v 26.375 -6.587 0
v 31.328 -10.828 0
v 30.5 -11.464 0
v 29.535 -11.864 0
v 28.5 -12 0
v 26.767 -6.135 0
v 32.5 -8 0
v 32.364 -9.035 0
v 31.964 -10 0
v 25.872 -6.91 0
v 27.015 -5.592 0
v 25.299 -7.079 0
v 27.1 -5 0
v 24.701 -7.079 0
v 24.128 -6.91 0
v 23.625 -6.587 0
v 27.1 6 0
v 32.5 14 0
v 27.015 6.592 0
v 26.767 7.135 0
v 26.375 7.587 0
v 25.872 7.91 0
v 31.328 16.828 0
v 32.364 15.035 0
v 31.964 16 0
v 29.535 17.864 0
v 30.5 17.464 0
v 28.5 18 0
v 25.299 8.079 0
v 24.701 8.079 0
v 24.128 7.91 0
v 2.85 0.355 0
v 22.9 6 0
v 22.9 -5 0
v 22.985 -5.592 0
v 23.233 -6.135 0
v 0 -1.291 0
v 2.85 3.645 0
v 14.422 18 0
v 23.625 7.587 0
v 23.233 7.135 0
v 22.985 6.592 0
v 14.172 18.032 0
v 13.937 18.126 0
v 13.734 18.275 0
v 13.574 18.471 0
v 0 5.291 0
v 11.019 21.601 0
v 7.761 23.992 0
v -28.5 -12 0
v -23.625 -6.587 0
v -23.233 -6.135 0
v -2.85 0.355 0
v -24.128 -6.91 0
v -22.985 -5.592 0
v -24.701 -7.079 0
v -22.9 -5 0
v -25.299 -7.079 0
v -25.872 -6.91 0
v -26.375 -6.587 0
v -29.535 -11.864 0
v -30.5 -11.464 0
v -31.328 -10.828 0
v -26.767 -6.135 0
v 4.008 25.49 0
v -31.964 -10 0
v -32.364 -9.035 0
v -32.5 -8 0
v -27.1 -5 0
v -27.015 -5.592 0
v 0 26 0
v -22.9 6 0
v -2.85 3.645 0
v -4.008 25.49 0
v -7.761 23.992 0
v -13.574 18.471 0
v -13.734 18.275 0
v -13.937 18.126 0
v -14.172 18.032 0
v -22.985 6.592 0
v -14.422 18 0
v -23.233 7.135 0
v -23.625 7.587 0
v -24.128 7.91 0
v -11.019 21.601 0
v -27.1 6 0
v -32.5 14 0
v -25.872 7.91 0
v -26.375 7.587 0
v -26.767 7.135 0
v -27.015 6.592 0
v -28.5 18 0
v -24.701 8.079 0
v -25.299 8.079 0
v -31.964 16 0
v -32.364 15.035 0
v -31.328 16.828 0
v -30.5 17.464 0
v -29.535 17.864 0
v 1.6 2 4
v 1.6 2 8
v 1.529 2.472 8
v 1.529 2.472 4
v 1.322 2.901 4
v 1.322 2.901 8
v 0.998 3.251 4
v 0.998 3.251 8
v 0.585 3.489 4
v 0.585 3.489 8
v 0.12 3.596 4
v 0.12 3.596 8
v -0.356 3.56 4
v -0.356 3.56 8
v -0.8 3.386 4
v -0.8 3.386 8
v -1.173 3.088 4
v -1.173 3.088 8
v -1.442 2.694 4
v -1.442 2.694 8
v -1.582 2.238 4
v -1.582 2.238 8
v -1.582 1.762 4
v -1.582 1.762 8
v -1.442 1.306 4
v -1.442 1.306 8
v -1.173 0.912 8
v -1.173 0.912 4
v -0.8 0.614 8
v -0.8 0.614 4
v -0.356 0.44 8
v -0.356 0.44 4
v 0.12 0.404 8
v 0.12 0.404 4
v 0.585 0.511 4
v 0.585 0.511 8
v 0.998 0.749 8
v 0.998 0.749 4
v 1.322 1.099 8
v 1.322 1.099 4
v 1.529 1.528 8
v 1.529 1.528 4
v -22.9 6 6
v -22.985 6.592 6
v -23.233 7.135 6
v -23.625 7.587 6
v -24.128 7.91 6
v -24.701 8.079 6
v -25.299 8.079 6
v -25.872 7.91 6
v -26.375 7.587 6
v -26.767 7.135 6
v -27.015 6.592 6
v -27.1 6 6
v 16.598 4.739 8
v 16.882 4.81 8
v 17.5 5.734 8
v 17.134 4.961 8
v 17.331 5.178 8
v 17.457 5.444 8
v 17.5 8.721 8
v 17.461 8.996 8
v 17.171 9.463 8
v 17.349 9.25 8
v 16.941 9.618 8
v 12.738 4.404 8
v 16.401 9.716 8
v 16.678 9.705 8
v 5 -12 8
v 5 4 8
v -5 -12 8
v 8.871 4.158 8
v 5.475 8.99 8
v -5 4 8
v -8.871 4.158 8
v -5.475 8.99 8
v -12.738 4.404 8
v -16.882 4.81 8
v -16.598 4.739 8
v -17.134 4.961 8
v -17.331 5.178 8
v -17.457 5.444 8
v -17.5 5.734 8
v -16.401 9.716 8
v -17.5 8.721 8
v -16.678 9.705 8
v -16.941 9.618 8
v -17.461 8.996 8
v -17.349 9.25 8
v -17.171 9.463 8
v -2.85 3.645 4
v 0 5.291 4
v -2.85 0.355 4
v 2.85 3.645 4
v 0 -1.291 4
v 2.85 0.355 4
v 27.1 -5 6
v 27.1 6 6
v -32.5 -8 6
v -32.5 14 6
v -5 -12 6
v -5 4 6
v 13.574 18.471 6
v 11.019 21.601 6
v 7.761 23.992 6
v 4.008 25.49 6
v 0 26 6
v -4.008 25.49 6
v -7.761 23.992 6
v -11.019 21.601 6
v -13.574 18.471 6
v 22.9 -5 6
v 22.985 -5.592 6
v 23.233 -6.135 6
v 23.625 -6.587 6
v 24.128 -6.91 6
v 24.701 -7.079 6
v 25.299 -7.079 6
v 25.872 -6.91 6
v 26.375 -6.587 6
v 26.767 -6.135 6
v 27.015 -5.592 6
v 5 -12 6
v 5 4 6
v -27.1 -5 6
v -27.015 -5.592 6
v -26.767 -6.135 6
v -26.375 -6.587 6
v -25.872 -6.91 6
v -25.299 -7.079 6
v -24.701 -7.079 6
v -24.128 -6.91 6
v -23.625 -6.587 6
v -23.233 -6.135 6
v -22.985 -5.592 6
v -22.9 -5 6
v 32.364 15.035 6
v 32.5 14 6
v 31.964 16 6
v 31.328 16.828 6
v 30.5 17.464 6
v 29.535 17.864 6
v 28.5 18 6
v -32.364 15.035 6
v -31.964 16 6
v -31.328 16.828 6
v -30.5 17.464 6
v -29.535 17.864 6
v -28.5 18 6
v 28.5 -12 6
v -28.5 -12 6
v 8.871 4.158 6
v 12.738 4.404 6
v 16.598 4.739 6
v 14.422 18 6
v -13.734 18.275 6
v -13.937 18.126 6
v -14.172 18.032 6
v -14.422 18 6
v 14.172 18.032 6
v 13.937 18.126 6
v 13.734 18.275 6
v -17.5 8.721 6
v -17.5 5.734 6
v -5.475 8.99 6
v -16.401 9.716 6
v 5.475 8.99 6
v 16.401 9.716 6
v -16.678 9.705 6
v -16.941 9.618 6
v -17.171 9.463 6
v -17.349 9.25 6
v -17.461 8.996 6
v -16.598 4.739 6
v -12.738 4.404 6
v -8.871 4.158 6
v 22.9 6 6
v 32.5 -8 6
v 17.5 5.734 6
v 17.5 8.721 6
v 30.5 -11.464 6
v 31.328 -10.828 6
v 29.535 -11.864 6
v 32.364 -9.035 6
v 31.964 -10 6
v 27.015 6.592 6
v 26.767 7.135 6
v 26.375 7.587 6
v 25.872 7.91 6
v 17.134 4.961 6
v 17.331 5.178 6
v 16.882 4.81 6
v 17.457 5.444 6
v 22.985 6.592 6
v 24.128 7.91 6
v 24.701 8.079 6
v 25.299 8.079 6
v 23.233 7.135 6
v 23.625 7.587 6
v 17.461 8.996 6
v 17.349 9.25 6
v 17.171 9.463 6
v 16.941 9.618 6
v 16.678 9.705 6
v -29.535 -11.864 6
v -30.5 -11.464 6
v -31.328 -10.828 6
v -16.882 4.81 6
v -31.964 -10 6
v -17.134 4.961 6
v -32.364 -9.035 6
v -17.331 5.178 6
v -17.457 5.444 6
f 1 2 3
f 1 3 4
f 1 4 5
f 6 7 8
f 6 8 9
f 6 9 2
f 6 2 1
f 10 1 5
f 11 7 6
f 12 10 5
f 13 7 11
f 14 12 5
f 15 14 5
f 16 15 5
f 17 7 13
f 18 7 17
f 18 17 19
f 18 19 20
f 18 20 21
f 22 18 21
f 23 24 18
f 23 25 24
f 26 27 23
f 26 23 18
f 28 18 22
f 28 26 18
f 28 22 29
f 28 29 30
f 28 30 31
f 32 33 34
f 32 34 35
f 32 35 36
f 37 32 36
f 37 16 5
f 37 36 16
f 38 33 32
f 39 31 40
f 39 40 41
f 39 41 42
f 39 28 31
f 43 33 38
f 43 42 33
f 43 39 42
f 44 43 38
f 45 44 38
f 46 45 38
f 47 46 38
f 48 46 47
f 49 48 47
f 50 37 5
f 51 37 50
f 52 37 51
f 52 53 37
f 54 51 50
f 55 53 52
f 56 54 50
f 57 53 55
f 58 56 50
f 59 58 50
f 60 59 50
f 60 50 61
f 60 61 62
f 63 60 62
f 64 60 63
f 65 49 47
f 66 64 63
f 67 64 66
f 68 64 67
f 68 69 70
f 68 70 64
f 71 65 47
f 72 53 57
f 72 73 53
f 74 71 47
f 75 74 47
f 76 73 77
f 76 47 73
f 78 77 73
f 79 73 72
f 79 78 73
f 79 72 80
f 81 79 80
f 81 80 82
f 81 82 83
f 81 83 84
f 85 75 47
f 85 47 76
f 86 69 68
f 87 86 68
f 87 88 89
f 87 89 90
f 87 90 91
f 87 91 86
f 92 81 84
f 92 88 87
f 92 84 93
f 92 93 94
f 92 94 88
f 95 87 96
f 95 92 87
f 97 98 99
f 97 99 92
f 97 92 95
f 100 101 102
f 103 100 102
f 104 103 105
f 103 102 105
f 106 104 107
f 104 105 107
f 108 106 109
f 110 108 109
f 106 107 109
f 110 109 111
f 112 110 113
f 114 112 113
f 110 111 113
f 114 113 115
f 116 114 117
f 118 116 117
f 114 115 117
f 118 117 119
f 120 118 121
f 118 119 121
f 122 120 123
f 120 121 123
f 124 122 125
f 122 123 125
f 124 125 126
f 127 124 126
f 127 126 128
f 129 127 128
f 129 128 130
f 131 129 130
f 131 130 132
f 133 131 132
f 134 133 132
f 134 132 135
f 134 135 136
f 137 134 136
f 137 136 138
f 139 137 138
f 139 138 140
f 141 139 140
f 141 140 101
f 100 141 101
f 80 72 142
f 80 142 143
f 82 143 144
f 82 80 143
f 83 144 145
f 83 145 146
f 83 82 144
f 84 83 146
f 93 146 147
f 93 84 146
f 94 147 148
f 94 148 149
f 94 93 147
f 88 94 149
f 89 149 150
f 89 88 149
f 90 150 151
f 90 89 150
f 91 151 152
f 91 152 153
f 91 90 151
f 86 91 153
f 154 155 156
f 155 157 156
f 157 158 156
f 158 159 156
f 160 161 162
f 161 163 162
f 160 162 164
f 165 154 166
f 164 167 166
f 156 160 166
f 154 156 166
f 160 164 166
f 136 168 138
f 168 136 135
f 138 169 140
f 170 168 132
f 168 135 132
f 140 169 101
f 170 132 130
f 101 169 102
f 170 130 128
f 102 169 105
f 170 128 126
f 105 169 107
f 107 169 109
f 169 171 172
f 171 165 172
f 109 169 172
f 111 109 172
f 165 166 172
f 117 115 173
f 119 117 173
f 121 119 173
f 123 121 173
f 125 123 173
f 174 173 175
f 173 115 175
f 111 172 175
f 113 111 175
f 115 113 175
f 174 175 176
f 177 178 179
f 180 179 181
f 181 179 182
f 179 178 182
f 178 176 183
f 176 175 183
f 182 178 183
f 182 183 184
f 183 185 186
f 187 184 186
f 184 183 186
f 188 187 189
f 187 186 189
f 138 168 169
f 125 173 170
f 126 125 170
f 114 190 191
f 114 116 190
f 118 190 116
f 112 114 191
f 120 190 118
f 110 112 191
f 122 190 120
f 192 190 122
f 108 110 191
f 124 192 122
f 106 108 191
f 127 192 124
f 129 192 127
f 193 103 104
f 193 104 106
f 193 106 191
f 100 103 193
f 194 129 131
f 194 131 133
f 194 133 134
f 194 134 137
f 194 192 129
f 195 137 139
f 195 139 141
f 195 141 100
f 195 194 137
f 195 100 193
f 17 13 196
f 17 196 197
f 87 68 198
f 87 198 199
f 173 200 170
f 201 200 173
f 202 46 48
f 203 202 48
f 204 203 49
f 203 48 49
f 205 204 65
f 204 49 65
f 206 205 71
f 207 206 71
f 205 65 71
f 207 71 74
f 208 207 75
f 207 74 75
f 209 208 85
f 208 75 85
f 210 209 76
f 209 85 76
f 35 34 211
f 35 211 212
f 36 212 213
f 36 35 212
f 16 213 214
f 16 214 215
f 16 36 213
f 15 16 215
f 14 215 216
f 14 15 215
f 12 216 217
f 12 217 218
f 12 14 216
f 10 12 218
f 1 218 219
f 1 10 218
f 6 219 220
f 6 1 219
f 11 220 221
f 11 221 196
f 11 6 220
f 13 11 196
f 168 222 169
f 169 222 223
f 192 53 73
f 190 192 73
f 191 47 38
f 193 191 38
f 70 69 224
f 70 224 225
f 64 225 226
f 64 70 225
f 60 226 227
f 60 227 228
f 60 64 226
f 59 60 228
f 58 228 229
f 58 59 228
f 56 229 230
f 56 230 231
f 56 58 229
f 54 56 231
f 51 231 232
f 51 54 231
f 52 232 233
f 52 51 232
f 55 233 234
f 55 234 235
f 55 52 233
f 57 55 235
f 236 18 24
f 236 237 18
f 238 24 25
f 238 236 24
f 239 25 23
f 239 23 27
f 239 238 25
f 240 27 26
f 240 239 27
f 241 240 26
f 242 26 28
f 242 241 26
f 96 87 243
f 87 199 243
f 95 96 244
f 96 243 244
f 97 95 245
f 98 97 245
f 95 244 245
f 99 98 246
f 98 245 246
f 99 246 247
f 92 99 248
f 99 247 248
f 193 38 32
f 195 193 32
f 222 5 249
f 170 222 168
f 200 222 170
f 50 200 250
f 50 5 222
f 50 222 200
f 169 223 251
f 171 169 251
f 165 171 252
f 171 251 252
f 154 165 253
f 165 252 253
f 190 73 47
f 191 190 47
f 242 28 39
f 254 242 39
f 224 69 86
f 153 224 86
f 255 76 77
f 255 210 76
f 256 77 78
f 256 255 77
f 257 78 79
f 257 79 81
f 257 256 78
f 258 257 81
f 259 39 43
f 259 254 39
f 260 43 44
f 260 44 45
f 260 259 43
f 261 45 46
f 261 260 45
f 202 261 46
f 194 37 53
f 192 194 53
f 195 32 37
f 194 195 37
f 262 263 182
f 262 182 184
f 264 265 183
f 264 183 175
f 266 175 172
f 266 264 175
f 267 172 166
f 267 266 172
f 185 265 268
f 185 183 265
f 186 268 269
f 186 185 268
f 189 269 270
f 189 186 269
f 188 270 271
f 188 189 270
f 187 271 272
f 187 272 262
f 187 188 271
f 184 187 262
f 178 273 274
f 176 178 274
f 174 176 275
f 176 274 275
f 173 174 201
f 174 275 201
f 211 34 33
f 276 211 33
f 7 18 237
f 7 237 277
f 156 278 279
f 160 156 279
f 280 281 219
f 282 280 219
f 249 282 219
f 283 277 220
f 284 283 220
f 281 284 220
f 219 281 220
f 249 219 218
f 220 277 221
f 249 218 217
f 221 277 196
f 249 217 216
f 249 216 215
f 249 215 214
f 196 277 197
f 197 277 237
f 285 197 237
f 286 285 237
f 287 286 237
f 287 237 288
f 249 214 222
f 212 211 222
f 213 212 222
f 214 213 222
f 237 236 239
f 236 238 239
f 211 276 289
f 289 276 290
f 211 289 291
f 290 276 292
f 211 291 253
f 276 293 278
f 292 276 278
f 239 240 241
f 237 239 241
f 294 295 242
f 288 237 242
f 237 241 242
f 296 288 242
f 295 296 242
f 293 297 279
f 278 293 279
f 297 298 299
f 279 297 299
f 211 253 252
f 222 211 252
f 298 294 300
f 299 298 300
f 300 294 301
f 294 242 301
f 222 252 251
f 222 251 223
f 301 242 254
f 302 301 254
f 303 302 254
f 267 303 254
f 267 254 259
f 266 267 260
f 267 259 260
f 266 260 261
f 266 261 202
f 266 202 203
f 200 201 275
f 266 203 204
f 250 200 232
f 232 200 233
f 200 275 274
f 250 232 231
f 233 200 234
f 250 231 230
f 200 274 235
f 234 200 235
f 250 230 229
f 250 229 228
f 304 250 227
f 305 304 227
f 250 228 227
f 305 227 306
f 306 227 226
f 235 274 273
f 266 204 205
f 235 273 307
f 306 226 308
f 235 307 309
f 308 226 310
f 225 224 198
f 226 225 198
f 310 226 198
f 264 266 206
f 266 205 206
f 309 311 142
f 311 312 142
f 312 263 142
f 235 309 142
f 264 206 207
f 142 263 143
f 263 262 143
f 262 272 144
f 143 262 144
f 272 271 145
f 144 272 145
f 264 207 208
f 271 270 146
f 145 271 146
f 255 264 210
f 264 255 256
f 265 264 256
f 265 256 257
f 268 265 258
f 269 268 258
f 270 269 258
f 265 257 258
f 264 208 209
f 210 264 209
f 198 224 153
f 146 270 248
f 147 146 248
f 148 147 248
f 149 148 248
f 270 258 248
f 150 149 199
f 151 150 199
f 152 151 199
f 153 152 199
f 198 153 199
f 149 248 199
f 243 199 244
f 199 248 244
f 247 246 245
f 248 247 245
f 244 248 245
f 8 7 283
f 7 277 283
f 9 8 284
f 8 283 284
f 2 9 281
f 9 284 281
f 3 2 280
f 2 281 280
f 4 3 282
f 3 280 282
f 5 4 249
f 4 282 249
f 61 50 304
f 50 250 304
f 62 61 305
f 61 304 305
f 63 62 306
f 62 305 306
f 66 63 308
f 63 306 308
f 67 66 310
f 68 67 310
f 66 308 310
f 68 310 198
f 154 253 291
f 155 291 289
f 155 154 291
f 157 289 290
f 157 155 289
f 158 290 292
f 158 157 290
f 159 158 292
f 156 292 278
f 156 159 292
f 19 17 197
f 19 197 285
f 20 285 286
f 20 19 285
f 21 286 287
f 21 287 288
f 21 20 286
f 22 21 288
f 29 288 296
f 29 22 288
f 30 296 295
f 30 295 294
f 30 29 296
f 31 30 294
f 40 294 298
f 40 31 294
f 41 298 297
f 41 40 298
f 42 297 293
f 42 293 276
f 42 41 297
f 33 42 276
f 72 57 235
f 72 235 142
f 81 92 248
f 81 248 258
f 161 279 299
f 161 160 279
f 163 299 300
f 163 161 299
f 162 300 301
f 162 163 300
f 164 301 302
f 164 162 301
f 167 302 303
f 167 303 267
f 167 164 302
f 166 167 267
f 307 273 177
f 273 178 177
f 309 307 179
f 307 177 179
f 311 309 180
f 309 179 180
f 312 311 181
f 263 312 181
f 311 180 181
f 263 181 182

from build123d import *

# Parameters (mm, degrees)
PAD_DEPTH       = 6
PAD001_DEPTH    = 2
SKETCH002_R     = 1.6
POCKET_DEPTH    = 8.001
POCKET001_DEPTH = 4
FILLET_R        = 4
FILLET001_R     = 1


with BuildPart() as part:
    # Sketch → Pad (new body)
    with BuildSketch(Plane.XY):
        with BuildLine():
            Line((32.5, 18), (32.5, -12))
            Line((32.5, -12), (-32.5, -12))
            Line((-32.5, -12), (-32.5, 18))
            Line((-32.5, 18), (-13.856406, 18))
            ThreePointArc((13.856406, 18), (0, 26), (-13.856406, 18))
            Line((32.5, 18), (13.856406, 18))
        make_face()
        with BuildLine():
            ThreePointArc((22.9, -5), (25, -7.1), (27.1, -5))
            Line((27.1, -5), (27.1, 6))
            ThreePointArc((27.1, 6), (25, 8.1), (22.9, 6))
            Line((22.9, -5), (22.9, 6))
        make_face(mode=Mode.SUBTRACT)
        with BuildLine():
            ThreePointArc((-27.1, -5), (-25, -7.1), (-22.9, -5))
            Line((-22.9, -5), (-22.9, 6))
            ThreePointArc((-22.9, 6), (-25, 8.1), (-27.1, 6))
            Line((-27.1, -5), (-27.1, 6))
        make_face(mode=Mode.SUBTRACT)
    extrude(amount=PAD_DEPTH)

    # Sketch001 → Pad001 (new body)
    with BuildSketch(Plane.XY.offset(6)):
        with BuildLine():
            Line((5, -12), (-5, -12))
            Line((-5, -12), (-5, 4))
            ThreePointArc((-17.5, 4.829723), (-11.257647, 4.299661), (-5, 4))
            Line((-17.5, 4.829723), (-17.5, 9.829723))
            ThreePointArc((-17.5, 9.829723), (0, 8.899068), (17.5, 9.829723))
            Line((17.5, 4.829723), (17.5, 9.829723))
            ThreePointArc((5, 4), (11.257647, 4.299661), (17.5, 4.829723))
            Line((5, -12), (5, 4))
        make_face()
    extrude(amount=PAD001_DEPTH)

    # Sketch002 → Pocket (cut, through all)
    with BuildSketch(Plane.XY.offset(8)):
        with Locations((0, 2)):
            Circle(SKETCH002_R)
    extrude(amount=-POCKET_DEPTH, mode=Mode.SUBTRACT)

    # Sketch003 → Pocket001 (cut)
    with BuildSketch(Plane(origin=(0, 0, 0), x_dir=(1, 0, 0), z_dir=(0, 0, -1))):
        Polygon((2.85, -3.645448), (2.85, -0.354552), (0, 1.290897), (-2.85, -0.354552), (-2.85, -3.645448), (0, -5.290897), align=None)
    extrude(amount=-POCKET001_DEPTH, mode=Mode.SUBTRACT)

    # Fillet
    fillet_edges = [part.edges().sort_by_distance(p)[0] for p in [
        (32.5, 18, 3),
        (32.5, -12, 3),
        (-32.5, 18, 3),
        (-32.5, -12, 3),
    ]]
    fillet(fillet_edges, radius=FILLET_R)

    # Fillet001
    fillet001_edges = [part.edges().sort_by_distance(p)[0] for p in [
        (17.5, 9.829723, 7),
        (17.5, 4.829723, 7),
        (-17.5, 9.829723, 7),
        (-17.5, 4.829723, 7),
        (-13.856406, 18, 3),
        (13.856406, 18, 3),
    ]]
    fillet(fillet001_edges, radius=FILLET001_R)


solid = part.part
